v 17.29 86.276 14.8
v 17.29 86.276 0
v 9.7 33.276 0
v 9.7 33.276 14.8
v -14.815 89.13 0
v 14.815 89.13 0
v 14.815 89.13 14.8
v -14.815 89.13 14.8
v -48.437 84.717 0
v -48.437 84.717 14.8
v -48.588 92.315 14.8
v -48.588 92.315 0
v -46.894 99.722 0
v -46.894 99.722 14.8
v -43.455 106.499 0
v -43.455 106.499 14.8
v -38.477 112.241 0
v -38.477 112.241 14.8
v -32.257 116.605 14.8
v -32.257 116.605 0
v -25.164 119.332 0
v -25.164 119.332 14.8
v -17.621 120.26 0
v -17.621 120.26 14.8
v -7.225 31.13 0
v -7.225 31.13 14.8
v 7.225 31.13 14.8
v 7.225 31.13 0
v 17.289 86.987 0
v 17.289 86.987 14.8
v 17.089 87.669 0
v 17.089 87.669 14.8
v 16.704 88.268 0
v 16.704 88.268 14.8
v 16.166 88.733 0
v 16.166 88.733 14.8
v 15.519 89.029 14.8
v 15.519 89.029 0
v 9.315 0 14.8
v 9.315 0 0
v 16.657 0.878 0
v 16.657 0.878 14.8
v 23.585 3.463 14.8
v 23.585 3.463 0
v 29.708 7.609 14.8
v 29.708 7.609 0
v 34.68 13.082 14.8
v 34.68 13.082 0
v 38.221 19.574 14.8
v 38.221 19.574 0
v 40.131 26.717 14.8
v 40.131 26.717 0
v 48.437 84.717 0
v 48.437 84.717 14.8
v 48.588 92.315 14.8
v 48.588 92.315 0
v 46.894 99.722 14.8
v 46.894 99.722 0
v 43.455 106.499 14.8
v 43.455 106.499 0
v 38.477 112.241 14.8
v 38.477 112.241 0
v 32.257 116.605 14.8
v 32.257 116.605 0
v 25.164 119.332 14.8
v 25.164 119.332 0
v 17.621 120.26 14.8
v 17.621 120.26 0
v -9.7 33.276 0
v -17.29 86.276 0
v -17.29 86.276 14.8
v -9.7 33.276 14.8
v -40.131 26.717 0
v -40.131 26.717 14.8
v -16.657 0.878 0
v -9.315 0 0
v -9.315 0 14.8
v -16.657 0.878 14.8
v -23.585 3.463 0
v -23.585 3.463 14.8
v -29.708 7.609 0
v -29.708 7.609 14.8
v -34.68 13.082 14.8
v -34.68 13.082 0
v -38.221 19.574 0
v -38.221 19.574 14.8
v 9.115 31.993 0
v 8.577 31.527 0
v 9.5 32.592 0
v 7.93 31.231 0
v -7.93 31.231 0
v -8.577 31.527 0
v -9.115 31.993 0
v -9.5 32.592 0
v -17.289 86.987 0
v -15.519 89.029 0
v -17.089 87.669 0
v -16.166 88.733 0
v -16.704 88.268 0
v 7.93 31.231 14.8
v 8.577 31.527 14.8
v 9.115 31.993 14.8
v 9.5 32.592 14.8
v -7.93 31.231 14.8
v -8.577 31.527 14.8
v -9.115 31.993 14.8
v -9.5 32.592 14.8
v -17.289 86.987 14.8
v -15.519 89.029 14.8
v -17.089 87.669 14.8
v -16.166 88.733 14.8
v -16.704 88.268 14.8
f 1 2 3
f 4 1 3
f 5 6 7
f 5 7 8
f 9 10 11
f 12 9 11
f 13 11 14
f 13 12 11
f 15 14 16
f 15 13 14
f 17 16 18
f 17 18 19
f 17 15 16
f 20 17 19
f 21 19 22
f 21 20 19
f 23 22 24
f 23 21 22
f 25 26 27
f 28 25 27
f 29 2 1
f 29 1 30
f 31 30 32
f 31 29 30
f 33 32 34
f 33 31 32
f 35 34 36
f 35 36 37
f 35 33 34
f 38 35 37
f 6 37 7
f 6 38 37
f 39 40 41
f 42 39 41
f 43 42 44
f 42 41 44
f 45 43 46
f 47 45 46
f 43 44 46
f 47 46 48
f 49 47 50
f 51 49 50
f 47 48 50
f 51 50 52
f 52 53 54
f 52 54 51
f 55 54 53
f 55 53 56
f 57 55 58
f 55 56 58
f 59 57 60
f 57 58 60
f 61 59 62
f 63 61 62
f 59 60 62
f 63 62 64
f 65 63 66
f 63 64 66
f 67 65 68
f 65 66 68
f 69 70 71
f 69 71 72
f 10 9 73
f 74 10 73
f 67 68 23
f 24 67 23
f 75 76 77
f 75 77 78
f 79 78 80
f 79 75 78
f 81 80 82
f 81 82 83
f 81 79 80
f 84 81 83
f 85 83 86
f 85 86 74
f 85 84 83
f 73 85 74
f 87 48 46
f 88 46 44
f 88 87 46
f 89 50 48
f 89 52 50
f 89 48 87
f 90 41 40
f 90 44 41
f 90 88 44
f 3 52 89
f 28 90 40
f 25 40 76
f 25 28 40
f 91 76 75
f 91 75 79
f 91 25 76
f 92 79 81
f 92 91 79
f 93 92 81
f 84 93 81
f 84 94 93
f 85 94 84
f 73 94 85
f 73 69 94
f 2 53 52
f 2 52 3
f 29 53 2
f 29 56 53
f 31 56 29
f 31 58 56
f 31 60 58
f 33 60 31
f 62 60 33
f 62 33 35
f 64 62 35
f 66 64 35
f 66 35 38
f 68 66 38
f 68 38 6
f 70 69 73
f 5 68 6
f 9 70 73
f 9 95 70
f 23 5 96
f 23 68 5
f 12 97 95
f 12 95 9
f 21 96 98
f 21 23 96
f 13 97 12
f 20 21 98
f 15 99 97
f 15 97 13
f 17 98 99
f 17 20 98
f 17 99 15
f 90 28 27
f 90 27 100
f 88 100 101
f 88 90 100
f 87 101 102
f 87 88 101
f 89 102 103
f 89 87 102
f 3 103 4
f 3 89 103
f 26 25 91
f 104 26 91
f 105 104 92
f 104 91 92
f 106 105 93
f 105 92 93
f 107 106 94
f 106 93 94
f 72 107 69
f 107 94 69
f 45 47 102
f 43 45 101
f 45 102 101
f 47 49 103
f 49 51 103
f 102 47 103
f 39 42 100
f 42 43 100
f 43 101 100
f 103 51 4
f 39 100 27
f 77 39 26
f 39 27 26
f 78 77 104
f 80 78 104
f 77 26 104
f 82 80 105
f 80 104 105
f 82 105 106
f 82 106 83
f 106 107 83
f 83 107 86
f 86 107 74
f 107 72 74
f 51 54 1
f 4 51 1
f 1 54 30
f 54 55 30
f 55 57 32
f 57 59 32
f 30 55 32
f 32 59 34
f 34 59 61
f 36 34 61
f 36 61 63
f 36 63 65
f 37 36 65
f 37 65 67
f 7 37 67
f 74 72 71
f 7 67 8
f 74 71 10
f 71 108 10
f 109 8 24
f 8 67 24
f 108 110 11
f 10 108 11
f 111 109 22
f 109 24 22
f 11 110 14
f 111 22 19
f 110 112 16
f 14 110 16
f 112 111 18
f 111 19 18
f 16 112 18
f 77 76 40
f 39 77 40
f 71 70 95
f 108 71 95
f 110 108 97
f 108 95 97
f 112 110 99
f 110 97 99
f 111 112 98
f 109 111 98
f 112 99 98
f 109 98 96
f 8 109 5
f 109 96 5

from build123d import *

# Parameters (mm, degrees)
PAD_DEPTH = 14.8


with BuildPart() as part:
    # Sketch → Pad (new body)
    with BuildSketch(Plane.XY):
        with BuildLine():
            Line((0, 89.13), (14.815, 89.13))
            ThreePointArc((17.289752, 86.275597), (16.703916, 88.26768), (14.815, 89.13))
            Line((17.289752, 86.275597), (9.699752, 33.275597))
            ThreePointArc((7.225, 31.13), (8.86268, 31.741084), (9.699752, 33.275597))
            Line((7.225, 31.13), (0, 31.13))
            Line((0, 31.13), (0, 0))
            Line((9.315394, 0), (0, 0))
            ThreePointArc((9.315394, 0), (29.707786, 7.609217), (40.131008, 26.716971))
            Line((48.437046, 84.716971), (40.131008, 26.716971))
            ThreePointArc((48.437046, 84.716971), (41.142215, 109.522392), (17.621432, 120.26))
            Line((0, 120.26), (17.621432, 120.26))
            Line((0, 120.26), (0, 89.13))
        make_face()
    pad = extrude(amount=PAD_DEPTH)

    # Mirrored: Pad across Sketch V_Axis
    add(pad.mirror(Plane(origin=(0, 0, 0), x_dir=(0, 0, 1), z_dir=(1, 0, 0))))


solid = part.part
